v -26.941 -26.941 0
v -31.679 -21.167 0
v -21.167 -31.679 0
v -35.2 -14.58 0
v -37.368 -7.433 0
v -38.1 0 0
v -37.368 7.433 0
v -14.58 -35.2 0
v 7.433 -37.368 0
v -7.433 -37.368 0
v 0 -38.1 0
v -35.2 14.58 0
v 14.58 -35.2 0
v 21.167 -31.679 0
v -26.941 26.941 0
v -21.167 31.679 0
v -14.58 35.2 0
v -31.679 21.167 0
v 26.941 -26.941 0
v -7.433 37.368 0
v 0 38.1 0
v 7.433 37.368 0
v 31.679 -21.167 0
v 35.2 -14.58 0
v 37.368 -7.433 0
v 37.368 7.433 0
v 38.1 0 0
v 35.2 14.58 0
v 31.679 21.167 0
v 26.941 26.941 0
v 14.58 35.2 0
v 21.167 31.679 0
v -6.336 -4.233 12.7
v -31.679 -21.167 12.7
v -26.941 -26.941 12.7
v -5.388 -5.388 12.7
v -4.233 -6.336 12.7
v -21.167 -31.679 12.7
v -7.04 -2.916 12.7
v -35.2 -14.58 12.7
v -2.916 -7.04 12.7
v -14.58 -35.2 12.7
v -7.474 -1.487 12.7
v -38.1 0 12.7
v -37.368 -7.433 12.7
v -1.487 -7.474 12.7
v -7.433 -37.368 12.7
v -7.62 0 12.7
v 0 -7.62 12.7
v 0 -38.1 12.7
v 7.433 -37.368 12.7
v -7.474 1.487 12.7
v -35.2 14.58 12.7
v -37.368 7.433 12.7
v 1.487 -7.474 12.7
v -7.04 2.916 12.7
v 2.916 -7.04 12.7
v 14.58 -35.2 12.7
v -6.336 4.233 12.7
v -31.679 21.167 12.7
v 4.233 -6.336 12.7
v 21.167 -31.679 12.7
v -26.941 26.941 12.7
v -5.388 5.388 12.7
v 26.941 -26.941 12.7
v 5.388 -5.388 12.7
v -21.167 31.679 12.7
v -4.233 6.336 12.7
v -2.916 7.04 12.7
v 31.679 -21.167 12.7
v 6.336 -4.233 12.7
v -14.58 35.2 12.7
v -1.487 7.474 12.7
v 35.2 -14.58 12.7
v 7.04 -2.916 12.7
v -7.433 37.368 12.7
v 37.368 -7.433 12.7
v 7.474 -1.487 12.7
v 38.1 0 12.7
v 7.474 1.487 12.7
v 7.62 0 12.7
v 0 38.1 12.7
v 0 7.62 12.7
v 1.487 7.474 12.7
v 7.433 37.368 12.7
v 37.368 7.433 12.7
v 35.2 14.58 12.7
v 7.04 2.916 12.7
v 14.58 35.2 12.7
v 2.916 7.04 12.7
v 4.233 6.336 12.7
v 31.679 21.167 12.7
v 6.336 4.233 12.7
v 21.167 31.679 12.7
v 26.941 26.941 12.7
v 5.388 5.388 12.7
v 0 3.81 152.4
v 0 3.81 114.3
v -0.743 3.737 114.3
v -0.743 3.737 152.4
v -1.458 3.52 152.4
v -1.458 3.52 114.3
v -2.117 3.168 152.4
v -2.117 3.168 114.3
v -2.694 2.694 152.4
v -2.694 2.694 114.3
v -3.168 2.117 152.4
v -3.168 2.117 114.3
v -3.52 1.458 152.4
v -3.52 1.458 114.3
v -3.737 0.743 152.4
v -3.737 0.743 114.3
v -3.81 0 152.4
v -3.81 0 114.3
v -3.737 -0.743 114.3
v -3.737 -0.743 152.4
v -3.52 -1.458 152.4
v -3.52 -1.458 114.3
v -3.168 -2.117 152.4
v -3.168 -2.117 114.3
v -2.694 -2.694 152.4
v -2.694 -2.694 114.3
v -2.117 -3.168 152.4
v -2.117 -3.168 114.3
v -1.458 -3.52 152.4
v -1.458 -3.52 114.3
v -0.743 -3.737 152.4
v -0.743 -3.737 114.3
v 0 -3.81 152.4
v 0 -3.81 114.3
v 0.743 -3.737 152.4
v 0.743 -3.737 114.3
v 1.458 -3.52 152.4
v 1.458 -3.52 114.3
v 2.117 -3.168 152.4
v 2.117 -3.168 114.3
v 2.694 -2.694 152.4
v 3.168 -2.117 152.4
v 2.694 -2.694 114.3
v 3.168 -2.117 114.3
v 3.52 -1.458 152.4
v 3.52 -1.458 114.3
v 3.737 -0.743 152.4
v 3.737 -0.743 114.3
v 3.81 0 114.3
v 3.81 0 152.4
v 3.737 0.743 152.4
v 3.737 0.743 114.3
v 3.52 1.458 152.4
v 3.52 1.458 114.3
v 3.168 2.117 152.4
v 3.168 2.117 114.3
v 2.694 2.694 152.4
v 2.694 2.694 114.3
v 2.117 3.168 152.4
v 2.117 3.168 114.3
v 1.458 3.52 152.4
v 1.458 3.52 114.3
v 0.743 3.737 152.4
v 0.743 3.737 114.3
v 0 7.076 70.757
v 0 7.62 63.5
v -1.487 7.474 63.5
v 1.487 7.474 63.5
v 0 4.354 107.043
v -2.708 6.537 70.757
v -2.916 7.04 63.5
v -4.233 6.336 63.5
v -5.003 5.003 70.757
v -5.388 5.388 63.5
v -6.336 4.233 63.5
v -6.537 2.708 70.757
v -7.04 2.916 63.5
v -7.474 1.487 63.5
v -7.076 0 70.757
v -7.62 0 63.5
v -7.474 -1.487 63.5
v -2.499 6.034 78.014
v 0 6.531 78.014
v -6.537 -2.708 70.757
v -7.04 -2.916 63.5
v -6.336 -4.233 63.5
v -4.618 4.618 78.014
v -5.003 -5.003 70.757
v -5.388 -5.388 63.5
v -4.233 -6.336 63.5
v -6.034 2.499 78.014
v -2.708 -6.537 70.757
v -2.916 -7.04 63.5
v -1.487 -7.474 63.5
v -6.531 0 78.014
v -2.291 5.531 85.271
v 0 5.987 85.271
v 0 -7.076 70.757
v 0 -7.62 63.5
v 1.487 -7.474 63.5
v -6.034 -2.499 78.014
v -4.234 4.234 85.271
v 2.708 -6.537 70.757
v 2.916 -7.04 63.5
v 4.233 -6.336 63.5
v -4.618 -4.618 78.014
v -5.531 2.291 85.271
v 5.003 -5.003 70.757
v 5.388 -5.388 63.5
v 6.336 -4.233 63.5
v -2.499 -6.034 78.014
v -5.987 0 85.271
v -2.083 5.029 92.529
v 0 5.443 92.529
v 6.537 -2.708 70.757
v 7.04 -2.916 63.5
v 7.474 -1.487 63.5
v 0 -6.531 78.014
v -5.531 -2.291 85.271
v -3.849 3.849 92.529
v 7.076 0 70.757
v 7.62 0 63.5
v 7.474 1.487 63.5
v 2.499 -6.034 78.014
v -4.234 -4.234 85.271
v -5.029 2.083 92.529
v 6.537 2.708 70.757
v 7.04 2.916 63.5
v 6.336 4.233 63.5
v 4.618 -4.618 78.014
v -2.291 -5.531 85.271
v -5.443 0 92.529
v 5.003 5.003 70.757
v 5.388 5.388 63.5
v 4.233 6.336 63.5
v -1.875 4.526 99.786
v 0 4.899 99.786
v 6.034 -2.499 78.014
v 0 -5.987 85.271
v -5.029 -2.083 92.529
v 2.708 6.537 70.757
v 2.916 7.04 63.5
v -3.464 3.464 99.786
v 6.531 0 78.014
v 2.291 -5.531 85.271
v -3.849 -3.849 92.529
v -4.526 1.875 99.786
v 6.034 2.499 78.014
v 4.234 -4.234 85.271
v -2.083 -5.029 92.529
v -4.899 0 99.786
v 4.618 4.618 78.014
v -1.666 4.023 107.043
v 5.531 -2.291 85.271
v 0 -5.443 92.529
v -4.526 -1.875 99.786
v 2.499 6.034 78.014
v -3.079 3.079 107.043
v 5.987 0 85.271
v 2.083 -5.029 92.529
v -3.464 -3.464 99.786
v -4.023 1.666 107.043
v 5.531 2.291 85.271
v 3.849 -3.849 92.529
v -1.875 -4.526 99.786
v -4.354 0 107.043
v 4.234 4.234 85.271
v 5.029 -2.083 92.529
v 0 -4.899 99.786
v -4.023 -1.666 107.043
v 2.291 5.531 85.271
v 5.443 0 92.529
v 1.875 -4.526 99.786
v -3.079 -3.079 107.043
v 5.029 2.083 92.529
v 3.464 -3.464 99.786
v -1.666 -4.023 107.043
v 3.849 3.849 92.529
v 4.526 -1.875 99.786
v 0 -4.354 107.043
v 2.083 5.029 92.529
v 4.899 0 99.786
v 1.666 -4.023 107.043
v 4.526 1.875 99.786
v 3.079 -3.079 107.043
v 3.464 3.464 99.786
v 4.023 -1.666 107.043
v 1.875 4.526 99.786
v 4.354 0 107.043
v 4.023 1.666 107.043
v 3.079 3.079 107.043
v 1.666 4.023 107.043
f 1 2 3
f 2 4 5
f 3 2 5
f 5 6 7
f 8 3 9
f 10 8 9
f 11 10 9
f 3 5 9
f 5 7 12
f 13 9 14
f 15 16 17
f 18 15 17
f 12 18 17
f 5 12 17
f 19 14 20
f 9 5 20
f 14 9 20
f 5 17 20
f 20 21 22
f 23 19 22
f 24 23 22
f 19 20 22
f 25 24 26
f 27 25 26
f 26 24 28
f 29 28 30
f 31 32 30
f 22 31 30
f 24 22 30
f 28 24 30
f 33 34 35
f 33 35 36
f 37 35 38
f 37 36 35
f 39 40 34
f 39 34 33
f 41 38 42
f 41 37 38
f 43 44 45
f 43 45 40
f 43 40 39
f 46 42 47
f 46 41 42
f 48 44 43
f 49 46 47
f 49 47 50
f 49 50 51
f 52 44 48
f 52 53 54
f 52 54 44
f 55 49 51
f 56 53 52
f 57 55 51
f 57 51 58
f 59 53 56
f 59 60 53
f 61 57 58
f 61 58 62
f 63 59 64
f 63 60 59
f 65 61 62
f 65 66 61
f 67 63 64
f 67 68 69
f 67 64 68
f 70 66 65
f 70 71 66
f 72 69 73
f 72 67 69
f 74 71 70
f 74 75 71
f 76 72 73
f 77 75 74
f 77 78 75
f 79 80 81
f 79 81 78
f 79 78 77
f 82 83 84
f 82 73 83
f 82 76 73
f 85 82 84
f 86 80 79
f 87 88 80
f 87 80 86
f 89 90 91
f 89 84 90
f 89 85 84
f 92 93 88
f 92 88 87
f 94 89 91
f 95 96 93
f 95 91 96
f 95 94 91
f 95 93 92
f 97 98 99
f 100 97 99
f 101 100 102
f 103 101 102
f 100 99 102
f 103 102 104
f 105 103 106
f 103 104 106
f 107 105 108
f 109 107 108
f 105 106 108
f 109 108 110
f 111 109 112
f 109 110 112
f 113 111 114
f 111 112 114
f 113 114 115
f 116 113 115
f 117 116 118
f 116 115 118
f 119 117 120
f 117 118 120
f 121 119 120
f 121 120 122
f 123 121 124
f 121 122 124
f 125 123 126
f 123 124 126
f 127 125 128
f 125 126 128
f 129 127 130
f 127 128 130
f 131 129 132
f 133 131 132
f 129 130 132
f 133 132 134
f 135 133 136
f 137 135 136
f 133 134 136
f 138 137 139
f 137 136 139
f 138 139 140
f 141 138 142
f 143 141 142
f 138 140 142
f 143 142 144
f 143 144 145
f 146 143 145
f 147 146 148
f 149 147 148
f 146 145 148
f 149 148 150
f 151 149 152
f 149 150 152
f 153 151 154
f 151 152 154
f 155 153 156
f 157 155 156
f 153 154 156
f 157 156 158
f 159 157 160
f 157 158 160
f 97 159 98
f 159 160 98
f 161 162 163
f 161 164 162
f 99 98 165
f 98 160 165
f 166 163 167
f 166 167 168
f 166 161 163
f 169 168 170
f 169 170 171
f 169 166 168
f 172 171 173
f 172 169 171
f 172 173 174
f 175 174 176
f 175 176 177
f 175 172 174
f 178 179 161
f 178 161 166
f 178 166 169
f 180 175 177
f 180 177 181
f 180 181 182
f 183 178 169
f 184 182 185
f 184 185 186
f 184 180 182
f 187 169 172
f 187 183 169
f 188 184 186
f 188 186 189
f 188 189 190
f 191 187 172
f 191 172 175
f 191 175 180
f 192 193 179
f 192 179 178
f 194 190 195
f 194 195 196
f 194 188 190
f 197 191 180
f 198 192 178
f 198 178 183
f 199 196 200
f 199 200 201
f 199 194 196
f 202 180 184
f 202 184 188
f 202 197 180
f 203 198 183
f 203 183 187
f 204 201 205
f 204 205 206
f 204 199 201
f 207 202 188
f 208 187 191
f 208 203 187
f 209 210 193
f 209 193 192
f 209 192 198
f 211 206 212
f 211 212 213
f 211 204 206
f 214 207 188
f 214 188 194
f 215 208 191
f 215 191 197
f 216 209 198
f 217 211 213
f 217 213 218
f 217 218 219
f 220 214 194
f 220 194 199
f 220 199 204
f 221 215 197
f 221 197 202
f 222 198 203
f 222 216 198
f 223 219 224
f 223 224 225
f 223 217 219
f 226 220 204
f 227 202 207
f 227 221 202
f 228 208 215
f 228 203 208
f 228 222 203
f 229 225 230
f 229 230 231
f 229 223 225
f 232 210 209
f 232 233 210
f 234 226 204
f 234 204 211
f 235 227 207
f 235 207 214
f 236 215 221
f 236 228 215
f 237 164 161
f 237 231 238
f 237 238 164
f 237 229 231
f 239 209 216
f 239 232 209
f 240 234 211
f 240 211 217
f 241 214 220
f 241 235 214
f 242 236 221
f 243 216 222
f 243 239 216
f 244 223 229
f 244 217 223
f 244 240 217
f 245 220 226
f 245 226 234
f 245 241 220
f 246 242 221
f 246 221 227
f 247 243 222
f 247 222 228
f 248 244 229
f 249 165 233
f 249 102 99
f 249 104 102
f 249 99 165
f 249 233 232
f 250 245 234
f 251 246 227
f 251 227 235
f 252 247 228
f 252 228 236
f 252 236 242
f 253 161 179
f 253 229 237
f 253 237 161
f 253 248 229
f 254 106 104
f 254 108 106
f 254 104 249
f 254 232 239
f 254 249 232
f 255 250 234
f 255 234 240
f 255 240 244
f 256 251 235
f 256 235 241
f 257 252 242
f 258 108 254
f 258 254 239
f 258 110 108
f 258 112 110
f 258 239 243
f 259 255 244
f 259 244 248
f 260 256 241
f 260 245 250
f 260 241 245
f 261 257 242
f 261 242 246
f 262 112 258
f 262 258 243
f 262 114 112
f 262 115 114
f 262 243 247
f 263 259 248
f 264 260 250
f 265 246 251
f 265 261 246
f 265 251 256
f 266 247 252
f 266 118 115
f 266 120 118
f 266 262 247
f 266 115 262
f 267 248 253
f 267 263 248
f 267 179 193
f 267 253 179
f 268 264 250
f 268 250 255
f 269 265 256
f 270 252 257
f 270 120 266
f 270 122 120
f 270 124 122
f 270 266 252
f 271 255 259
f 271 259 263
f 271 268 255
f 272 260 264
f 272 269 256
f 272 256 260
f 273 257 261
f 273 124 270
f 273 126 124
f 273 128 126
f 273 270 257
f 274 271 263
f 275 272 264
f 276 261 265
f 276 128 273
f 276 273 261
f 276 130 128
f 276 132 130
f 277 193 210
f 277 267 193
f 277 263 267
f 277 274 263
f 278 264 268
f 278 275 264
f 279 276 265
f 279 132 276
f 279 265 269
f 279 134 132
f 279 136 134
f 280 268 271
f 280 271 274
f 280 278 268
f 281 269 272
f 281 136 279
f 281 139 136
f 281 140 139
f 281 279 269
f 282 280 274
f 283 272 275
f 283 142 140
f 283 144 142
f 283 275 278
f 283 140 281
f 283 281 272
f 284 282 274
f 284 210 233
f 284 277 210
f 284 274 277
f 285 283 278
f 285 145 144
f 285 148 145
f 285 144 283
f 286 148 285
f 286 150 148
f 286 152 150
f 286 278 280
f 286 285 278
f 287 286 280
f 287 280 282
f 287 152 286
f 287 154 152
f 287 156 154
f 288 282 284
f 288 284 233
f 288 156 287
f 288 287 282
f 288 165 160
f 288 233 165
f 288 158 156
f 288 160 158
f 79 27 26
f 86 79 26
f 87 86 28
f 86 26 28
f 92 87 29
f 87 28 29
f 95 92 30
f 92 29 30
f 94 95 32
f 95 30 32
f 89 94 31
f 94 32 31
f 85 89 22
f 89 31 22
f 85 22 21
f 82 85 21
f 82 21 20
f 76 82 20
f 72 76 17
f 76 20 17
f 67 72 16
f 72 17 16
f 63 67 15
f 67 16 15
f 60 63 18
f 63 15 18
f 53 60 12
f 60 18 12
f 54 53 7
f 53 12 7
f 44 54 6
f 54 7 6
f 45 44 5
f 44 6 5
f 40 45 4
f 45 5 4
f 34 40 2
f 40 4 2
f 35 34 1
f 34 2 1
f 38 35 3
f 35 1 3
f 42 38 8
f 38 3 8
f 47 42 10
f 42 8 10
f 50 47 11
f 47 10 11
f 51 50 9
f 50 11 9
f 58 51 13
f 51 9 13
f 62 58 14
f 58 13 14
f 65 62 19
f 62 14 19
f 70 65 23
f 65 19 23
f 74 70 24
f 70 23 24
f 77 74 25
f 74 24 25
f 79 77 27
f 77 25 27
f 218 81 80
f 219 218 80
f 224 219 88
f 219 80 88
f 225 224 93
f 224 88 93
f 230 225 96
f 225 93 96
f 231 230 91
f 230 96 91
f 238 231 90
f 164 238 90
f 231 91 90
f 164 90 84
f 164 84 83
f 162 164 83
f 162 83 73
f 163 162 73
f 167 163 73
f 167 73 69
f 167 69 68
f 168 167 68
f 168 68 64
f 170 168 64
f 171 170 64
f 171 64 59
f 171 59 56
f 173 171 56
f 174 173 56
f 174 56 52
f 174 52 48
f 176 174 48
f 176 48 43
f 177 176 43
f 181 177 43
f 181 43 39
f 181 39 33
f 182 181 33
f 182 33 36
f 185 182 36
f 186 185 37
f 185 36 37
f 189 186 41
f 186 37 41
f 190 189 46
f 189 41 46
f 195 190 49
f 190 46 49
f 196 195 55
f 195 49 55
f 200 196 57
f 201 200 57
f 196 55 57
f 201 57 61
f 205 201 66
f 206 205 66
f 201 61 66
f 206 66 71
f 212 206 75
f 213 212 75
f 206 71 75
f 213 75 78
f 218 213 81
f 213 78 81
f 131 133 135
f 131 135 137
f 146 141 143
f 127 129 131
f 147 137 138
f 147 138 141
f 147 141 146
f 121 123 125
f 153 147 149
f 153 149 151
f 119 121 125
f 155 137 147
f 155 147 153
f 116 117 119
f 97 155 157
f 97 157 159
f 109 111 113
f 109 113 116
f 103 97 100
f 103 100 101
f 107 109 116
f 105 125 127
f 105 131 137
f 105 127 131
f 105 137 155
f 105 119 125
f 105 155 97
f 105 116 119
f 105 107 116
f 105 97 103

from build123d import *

# Parameters (mm, degrees)
F0_R     = 38.1
F1_DEPTH = 12.7
F2_R     = 7.62
F3_DEPTH = 50.8
F6_DEPTH = 38.1


# Not quite as in the source:
# - a feature names something its author has since deleted; it is built from what else it names


with BuildPart() as f1:
    # F0 (on Top) → F1 (new body)
    with BuildSketch(Plane.XY):
        Circle(F0_R)
    extrude(amount=F1_DEPTH)

    # F2 (on face) → F3 (join)
    with BuildSketch(Plane.XY.offset(12.7)):
        Circle(F2_R)
    extrude(amount=F3_DEPTH)

    # F4 (on Right) → F5 (revolve)
    with BuildSketch(Plane.YZ):
        Polygon((0, 114.3), (0, 63.5), (7.62, 63.5), (3.81, 114.3), align=None)
    revolve(axis=Axis((0, 0, 88.9), (0, 0, 1)))

    # F6 (add): a face of the model
    f6_faces = [f1.faces().sort_by_distance(p)[0] for p in [
        (0, 0, 114.3),
    ]]
    extrude(f6_faces, amount=F6_DEPTH)


solid = f1.part
